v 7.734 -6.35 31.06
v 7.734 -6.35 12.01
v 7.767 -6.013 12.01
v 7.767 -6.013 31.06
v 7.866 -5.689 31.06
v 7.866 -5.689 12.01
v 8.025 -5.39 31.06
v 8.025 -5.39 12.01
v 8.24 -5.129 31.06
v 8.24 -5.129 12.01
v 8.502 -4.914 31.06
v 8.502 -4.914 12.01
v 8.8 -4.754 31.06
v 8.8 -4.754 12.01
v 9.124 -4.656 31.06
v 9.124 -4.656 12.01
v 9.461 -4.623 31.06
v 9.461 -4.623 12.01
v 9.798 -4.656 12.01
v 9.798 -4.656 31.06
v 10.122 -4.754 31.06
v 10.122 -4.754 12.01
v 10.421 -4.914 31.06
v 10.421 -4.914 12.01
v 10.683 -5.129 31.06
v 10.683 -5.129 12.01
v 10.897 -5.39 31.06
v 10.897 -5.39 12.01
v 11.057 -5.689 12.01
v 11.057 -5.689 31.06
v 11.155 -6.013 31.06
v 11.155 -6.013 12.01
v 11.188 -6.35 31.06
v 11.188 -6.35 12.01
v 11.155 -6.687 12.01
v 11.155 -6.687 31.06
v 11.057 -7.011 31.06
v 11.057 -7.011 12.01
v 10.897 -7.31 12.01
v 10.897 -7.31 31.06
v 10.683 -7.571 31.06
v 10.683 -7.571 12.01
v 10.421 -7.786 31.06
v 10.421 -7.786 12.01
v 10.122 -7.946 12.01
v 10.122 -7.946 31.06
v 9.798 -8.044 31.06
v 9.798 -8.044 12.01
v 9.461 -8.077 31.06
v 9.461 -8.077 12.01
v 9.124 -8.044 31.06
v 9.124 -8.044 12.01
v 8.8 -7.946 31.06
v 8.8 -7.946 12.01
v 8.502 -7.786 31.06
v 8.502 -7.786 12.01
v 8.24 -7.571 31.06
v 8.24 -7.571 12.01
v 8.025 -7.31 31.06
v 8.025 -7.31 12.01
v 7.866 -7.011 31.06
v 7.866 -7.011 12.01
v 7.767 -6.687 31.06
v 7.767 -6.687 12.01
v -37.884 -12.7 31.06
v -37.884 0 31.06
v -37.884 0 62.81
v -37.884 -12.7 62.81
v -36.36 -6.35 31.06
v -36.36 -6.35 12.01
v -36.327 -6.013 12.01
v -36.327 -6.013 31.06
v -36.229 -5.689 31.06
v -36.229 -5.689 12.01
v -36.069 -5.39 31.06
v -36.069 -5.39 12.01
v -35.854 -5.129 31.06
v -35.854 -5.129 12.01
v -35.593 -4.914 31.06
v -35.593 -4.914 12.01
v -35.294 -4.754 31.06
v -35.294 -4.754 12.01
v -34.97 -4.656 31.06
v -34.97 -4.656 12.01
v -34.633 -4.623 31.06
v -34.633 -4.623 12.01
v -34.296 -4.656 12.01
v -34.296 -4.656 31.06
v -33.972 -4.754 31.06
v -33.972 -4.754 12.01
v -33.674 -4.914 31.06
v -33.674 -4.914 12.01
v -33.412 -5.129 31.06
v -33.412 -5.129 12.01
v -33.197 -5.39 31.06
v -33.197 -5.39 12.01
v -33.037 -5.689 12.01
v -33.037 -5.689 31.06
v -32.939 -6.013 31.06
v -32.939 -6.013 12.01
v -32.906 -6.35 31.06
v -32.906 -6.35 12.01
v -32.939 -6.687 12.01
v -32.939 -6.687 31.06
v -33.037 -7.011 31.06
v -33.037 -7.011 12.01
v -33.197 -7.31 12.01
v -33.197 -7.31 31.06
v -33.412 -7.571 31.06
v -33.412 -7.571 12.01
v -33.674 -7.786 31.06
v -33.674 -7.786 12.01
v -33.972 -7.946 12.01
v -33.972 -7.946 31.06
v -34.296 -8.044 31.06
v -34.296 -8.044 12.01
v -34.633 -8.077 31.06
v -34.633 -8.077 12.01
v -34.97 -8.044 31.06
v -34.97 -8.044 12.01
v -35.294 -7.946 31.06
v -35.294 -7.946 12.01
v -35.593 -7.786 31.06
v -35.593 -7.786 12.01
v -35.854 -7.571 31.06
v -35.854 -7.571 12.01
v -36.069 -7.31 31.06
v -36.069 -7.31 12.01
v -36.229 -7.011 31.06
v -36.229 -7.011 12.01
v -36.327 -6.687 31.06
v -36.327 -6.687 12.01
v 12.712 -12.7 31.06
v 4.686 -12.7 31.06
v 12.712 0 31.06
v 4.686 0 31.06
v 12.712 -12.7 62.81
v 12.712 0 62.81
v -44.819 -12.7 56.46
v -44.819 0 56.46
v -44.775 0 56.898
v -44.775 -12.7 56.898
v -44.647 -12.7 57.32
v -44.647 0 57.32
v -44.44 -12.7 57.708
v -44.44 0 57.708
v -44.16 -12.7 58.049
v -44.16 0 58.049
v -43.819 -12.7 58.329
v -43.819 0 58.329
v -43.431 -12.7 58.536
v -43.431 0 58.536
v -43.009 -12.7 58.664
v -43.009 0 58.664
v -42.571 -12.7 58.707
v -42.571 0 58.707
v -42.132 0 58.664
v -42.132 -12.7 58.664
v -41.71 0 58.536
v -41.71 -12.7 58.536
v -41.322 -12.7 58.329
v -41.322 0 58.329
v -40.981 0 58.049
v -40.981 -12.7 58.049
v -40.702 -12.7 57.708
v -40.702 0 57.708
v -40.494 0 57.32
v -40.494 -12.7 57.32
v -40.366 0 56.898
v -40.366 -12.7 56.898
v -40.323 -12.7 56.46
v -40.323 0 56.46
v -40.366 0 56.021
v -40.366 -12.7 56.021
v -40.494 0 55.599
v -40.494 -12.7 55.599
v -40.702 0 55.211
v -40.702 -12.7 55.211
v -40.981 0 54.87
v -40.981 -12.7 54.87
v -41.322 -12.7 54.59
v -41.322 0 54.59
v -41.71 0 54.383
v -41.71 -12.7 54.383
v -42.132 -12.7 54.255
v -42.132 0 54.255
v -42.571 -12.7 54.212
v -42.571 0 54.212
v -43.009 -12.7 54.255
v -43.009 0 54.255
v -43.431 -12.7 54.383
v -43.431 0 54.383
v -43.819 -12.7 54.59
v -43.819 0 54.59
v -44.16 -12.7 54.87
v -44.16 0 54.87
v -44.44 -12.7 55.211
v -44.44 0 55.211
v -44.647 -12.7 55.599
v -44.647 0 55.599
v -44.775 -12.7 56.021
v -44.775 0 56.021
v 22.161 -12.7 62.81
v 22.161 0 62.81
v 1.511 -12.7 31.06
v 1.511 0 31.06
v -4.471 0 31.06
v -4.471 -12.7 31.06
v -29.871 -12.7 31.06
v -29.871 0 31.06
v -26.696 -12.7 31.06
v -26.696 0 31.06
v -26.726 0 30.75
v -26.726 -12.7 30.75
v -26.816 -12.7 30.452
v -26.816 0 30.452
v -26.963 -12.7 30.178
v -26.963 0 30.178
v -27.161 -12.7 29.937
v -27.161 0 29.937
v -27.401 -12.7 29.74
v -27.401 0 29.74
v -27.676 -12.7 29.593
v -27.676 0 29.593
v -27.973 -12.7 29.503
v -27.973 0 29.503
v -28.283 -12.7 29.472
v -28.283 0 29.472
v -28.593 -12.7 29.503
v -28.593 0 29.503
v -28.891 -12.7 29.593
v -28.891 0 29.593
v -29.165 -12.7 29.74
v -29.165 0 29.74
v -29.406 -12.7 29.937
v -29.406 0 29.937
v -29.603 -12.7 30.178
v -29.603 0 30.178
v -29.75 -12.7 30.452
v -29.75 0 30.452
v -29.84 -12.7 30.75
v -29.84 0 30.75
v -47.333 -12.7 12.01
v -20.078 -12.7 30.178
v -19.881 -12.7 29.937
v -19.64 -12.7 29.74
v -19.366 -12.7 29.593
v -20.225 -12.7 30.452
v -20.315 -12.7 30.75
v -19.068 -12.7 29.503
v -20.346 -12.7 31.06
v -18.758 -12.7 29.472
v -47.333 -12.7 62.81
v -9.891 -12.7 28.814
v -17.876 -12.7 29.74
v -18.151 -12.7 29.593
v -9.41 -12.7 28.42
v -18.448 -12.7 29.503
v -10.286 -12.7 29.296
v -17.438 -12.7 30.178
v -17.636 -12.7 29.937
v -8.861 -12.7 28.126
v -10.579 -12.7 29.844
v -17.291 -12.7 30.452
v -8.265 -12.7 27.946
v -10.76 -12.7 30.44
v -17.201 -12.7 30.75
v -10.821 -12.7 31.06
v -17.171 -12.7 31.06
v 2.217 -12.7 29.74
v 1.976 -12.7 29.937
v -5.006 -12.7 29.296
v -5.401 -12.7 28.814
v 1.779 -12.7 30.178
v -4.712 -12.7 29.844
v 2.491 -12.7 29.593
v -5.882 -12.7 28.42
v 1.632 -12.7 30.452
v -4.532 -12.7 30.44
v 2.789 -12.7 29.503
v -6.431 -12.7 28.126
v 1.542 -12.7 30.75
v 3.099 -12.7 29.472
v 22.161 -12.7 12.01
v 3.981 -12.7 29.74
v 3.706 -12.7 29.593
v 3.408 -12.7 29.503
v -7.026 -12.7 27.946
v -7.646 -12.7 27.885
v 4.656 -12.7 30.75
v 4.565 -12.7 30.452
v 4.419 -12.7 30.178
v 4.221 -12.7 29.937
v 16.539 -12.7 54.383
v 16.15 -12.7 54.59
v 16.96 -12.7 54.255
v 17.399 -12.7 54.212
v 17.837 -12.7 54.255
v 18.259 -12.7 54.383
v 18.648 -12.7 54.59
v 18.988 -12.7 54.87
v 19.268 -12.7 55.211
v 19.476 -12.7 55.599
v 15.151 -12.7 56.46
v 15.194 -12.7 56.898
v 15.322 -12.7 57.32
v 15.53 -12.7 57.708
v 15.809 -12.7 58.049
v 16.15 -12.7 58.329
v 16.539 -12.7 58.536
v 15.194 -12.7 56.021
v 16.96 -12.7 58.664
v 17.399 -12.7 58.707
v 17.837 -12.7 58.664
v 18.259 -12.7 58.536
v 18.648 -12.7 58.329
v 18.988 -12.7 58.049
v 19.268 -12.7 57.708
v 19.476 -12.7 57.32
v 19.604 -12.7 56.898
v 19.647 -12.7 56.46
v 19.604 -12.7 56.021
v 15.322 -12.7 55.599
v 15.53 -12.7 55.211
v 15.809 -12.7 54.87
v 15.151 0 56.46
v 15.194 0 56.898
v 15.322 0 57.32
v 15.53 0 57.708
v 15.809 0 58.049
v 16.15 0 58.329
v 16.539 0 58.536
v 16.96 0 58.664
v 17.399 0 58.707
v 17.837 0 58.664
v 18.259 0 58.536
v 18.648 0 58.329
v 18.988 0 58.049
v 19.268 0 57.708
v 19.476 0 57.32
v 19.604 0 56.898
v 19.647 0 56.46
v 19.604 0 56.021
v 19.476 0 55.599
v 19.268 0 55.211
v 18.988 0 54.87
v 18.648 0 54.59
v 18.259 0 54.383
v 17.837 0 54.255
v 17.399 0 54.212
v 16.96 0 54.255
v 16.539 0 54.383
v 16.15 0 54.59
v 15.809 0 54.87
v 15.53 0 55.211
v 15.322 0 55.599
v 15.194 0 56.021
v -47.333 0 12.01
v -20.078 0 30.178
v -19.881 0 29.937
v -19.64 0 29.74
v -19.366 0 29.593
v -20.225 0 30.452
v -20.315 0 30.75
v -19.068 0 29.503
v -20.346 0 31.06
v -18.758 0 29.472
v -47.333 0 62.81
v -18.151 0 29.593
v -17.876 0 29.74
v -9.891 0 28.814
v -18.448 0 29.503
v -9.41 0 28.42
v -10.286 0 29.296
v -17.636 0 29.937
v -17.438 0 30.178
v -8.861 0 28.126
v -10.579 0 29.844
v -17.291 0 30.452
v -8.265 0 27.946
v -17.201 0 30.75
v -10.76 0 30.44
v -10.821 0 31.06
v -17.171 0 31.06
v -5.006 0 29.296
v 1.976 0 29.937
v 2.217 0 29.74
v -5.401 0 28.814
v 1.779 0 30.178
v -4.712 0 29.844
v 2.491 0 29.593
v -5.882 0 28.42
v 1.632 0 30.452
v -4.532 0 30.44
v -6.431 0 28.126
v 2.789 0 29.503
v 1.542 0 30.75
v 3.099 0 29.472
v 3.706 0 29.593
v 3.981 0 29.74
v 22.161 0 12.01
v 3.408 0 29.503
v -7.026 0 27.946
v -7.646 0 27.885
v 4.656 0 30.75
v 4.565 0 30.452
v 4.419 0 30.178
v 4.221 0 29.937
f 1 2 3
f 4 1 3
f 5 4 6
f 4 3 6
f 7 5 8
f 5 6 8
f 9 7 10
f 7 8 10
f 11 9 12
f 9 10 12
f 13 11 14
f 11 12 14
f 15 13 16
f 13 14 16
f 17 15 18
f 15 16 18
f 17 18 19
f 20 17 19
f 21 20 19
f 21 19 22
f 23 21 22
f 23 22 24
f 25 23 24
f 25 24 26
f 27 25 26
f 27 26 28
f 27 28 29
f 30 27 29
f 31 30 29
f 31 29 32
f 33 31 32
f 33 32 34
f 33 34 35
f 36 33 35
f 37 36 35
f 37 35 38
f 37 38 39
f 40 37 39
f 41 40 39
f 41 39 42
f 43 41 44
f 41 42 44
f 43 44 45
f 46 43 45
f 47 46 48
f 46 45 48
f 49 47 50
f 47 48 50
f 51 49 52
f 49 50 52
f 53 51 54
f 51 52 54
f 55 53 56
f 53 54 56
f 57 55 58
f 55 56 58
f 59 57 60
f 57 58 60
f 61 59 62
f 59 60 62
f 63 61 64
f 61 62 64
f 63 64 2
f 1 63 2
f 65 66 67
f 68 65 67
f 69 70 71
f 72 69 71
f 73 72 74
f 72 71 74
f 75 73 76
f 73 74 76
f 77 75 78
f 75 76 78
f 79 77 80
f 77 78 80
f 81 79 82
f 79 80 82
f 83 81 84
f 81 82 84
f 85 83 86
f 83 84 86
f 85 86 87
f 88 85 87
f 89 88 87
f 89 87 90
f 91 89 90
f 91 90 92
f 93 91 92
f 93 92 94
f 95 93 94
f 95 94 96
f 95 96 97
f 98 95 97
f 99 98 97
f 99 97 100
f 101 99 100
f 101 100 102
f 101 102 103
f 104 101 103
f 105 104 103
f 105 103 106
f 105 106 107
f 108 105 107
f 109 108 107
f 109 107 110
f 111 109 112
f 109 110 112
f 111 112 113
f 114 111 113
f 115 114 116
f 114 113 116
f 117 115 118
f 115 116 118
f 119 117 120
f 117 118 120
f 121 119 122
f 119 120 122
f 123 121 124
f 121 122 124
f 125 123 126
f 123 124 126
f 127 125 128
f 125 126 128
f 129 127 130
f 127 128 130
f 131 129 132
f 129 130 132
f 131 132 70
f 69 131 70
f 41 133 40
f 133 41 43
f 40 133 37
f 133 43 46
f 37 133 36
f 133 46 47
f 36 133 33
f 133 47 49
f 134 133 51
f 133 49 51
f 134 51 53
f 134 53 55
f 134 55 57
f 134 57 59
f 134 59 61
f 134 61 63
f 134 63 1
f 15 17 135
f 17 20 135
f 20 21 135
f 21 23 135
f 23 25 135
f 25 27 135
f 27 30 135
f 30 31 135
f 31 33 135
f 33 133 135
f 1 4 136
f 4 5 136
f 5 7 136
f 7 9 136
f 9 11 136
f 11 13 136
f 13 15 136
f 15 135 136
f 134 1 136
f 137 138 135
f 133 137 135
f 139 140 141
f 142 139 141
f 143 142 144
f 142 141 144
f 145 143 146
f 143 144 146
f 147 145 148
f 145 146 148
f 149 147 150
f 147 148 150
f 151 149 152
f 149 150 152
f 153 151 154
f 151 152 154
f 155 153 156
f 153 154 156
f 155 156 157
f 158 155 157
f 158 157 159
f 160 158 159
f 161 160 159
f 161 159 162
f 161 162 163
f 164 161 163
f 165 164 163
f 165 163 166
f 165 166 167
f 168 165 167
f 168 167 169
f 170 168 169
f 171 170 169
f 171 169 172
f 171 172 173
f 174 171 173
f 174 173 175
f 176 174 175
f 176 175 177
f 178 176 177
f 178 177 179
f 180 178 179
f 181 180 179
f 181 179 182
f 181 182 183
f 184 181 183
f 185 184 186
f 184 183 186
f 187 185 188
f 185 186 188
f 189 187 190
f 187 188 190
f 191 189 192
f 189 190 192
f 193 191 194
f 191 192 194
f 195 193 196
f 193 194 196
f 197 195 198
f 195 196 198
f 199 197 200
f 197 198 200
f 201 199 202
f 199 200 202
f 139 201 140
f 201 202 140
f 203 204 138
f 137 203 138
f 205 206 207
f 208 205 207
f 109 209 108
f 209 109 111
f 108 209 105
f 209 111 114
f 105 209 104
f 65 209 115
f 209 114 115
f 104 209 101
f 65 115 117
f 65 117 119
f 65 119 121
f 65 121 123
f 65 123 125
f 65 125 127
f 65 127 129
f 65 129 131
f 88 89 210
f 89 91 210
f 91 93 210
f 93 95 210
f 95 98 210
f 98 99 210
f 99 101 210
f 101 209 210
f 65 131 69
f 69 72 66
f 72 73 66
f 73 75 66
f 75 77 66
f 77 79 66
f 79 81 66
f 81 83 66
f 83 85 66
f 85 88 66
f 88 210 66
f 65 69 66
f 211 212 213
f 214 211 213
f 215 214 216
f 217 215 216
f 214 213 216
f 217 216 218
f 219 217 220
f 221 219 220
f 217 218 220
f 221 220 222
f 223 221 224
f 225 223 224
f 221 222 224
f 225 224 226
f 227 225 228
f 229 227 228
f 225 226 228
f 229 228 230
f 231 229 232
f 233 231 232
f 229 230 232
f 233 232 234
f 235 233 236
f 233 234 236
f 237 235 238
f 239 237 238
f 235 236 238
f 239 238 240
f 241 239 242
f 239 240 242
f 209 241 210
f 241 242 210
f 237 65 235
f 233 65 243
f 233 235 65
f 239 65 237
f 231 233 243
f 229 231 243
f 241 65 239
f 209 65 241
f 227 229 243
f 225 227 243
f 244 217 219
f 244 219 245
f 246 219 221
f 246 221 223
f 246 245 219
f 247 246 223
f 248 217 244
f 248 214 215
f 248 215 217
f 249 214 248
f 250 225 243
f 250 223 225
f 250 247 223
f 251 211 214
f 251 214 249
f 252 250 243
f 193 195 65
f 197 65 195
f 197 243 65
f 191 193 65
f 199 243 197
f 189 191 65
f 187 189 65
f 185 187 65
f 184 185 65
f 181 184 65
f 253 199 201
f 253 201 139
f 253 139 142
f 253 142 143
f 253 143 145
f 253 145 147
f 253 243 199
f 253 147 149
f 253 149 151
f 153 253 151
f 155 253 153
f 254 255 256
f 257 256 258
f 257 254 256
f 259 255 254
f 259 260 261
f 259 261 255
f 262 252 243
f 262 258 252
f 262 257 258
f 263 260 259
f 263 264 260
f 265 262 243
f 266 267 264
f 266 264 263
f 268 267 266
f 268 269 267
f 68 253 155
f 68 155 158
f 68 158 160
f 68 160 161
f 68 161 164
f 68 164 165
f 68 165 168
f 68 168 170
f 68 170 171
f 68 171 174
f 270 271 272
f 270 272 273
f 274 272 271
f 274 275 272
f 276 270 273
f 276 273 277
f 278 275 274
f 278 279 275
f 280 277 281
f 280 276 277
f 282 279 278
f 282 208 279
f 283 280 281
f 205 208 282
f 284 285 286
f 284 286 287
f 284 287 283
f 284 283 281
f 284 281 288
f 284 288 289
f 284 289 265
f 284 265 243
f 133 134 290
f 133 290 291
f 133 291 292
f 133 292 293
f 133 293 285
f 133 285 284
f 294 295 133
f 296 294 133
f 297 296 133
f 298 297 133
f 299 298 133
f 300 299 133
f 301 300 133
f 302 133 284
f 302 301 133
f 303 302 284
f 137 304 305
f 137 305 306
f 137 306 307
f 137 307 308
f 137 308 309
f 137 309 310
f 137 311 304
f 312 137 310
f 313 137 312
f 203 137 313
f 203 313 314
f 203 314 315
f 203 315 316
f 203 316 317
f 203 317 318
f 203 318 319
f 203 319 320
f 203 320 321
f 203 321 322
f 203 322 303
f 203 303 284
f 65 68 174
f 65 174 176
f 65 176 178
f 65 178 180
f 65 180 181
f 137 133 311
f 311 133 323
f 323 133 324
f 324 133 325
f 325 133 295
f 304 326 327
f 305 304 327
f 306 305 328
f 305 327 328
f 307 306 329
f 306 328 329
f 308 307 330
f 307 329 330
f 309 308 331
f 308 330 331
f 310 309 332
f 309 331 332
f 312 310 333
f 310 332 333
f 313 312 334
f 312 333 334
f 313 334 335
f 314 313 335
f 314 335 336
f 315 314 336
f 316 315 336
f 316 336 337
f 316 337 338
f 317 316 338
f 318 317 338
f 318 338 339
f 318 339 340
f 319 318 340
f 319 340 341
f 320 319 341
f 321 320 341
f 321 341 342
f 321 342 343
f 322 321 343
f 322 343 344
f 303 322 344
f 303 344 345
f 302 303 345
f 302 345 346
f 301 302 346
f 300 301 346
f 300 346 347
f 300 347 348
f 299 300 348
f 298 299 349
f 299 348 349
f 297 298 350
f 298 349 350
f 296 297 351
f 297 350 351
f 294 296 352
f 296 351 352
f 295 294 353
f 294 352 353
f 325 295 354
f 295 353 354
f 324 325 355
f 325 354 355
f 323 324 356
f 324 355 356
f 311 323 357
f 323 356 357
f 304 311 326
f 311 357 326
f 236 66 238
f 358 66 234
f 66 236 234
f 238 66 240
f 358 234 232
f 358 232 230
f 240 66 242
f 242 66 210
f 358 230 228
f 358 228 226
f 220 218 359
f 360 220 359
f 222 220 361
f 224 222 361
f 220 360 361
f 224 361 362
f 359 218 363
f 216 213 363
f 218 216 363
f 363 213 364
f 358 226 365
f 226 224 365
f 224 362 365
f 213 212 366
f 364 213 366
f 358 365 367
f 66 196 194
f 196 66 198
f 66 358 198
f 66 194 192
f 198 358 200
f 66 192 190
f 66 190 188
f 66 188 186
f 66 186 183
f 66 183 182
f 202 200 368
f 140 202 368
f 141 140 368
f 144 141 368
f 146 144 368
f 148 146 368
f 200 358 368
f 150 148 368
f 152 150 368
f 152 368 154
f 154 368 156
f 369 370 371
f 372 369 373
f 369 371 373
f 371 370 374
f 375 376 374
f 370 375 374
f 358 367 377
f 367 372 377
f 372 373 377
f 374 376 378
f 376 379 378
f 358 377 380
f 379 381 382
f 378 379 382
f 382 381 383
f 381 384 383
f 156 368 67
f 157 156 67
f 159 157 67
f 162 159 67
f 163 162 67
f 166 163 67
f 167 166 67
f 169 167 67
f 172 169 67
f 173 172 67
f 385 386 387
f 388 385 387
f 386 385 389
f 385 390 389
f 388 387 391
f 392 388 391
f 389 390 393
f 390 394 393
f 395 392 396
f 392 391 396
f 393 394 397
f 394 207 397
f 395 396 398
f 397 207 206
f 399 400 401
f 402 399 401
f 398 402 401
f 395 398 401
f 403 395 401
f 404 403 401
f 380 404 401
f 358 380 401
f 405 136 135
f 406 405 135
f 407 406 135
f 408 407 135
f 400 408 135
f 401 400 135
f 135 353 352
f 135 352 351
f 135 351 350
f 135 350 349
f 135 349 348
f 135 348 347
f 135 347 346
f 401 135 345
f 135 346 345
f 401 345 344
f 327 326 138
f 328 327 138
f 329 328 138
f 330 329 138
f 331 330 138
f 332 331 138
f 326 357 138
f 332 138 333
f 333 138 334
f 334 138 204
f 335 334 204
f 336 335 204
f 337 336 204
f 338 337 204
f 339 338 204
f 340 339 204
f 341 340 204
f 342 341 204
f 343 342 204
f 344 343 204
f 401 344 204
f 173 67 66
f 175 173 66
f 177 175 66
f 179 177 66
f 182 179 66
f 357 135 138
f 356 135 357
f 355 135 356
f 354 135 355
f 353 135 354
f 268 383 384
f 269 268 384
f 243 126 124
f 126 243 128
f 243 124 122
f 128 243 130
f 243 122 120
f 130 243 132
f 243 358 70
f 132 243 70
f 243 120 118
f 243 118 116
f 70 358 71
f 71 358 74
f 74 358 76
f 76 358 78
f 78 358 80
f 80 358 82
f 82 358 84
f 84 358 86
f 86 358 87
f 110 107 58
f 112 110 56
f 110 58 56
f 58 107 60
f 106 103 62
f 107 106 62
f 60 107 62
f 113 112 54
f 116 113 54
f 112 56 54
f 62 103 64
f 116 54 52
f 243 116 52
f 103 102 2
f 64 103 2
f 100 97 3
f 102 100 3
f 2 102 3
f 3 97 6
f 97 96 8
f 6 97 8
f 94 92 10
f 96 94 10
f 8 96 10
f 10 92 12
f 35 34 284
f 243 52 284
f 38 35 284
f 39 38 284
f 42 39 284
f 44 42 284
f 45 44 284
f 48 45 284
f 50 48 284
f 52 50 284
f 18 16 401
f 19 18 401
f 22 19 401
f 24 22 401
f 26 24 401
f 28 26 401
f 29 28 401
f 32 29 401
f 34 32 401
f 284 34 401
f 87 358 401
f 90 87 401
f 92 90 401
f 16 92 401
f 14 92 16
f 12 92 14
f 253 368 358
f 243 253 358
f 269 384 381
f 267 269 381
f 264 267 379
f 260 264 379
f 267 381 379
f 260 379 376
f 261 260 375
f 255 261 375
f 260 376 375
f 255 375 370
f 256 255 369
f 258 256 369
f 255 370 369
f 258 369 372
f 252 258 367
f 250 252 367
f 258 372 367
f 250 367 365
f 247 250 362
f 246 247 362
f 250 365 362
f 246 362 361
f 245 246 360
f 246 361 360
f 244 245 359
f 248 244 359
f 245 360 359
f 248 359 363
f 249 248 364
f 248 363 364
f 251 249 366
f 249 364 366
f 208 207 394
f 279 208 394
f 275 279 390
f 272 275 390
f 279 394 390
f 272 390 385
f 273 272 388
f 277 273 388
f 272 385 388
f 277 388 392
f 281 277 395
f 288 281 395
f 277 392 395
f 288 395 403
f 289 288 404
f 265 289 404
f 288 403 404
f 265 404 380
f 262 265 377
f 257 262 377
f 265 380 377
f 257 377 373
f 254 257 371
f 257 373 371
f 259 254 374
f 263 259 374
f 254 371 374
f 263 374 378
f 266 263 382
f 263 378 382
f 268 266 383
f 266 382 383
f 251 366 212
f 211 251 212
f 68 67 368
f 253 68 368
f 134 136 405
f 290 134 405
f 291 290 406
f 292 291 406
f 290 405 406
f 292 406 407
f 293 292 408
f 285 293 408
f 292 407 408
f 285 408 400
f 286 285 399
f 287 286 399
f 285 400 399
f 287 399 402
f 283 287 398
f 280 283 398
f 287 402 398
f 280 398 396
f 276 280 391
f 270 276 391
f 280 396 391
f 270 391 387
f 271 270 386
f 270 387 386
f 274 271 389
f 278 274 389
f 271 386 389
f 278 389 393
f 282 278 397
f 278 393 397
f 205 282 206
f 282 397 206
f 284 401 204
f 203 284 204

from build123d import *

# Parameters (mm, degrees)
F1_DEPTH = 12.7
F3_D     = 3.175
F4_D     = 6.35
F6_D     = 4.4958
F8_D     = 3.4544
F10_D    = 3.4544


with BuildPart() as f1:
    # F0 (on Front) → F1 (new body)
    with BuildSketch(Plane.XZ):
        Polygon((-37.8843045536, 62.8095008674), (-47.3331045536, 62.8095008674), (-47.3331045536, 12.0095008674), (22.1612954464, 12.0095008674), (22.1612954464, 62.8095008674), (12.7124954464, 62.8095008674), (12.7124954464, 31.0595008674), (-37.8843045536, 31.0595008674), align=None)
    extrude(amount=F1_DEPTH)

    # F3 (through all)
    with Locations(Plane.XZ.offset(12.7)):
        with Locations((-28.2831045536, 31.0595008674), (-18.7581045536, 31.0595008674), (3.0985954464, 31.0595008674)):
            Hole(F3_D / 2)

    # F4 (through all)
    with Locations(Plane.XZ.offset(12.7)):
        with Locations((-7.6456045536, 31.0595008674)):
            Hole(F4_D / 2)

    # F6 (through all)
    with Locations(Plane.XZ.offset(12.7)):
        with Locations((-42.5706045536, 56.4595008674), (17.3987954464, 56.4595008674)):
            Hole(F6_D / 2)

    # F8 (through all)
    with Locations(Plane.XY.offset(31.0595008674)):
        with Locations((-34.6331045536, -6.35)):
            Hole(F8_D / 2)

    # F10 (through all)
    with Locations(Plane.XY.offset(31.0595008674)):
        with Locations((9.4612954464, -6.35)):
            Hole(F10_D / 2)


solid = f1.part
